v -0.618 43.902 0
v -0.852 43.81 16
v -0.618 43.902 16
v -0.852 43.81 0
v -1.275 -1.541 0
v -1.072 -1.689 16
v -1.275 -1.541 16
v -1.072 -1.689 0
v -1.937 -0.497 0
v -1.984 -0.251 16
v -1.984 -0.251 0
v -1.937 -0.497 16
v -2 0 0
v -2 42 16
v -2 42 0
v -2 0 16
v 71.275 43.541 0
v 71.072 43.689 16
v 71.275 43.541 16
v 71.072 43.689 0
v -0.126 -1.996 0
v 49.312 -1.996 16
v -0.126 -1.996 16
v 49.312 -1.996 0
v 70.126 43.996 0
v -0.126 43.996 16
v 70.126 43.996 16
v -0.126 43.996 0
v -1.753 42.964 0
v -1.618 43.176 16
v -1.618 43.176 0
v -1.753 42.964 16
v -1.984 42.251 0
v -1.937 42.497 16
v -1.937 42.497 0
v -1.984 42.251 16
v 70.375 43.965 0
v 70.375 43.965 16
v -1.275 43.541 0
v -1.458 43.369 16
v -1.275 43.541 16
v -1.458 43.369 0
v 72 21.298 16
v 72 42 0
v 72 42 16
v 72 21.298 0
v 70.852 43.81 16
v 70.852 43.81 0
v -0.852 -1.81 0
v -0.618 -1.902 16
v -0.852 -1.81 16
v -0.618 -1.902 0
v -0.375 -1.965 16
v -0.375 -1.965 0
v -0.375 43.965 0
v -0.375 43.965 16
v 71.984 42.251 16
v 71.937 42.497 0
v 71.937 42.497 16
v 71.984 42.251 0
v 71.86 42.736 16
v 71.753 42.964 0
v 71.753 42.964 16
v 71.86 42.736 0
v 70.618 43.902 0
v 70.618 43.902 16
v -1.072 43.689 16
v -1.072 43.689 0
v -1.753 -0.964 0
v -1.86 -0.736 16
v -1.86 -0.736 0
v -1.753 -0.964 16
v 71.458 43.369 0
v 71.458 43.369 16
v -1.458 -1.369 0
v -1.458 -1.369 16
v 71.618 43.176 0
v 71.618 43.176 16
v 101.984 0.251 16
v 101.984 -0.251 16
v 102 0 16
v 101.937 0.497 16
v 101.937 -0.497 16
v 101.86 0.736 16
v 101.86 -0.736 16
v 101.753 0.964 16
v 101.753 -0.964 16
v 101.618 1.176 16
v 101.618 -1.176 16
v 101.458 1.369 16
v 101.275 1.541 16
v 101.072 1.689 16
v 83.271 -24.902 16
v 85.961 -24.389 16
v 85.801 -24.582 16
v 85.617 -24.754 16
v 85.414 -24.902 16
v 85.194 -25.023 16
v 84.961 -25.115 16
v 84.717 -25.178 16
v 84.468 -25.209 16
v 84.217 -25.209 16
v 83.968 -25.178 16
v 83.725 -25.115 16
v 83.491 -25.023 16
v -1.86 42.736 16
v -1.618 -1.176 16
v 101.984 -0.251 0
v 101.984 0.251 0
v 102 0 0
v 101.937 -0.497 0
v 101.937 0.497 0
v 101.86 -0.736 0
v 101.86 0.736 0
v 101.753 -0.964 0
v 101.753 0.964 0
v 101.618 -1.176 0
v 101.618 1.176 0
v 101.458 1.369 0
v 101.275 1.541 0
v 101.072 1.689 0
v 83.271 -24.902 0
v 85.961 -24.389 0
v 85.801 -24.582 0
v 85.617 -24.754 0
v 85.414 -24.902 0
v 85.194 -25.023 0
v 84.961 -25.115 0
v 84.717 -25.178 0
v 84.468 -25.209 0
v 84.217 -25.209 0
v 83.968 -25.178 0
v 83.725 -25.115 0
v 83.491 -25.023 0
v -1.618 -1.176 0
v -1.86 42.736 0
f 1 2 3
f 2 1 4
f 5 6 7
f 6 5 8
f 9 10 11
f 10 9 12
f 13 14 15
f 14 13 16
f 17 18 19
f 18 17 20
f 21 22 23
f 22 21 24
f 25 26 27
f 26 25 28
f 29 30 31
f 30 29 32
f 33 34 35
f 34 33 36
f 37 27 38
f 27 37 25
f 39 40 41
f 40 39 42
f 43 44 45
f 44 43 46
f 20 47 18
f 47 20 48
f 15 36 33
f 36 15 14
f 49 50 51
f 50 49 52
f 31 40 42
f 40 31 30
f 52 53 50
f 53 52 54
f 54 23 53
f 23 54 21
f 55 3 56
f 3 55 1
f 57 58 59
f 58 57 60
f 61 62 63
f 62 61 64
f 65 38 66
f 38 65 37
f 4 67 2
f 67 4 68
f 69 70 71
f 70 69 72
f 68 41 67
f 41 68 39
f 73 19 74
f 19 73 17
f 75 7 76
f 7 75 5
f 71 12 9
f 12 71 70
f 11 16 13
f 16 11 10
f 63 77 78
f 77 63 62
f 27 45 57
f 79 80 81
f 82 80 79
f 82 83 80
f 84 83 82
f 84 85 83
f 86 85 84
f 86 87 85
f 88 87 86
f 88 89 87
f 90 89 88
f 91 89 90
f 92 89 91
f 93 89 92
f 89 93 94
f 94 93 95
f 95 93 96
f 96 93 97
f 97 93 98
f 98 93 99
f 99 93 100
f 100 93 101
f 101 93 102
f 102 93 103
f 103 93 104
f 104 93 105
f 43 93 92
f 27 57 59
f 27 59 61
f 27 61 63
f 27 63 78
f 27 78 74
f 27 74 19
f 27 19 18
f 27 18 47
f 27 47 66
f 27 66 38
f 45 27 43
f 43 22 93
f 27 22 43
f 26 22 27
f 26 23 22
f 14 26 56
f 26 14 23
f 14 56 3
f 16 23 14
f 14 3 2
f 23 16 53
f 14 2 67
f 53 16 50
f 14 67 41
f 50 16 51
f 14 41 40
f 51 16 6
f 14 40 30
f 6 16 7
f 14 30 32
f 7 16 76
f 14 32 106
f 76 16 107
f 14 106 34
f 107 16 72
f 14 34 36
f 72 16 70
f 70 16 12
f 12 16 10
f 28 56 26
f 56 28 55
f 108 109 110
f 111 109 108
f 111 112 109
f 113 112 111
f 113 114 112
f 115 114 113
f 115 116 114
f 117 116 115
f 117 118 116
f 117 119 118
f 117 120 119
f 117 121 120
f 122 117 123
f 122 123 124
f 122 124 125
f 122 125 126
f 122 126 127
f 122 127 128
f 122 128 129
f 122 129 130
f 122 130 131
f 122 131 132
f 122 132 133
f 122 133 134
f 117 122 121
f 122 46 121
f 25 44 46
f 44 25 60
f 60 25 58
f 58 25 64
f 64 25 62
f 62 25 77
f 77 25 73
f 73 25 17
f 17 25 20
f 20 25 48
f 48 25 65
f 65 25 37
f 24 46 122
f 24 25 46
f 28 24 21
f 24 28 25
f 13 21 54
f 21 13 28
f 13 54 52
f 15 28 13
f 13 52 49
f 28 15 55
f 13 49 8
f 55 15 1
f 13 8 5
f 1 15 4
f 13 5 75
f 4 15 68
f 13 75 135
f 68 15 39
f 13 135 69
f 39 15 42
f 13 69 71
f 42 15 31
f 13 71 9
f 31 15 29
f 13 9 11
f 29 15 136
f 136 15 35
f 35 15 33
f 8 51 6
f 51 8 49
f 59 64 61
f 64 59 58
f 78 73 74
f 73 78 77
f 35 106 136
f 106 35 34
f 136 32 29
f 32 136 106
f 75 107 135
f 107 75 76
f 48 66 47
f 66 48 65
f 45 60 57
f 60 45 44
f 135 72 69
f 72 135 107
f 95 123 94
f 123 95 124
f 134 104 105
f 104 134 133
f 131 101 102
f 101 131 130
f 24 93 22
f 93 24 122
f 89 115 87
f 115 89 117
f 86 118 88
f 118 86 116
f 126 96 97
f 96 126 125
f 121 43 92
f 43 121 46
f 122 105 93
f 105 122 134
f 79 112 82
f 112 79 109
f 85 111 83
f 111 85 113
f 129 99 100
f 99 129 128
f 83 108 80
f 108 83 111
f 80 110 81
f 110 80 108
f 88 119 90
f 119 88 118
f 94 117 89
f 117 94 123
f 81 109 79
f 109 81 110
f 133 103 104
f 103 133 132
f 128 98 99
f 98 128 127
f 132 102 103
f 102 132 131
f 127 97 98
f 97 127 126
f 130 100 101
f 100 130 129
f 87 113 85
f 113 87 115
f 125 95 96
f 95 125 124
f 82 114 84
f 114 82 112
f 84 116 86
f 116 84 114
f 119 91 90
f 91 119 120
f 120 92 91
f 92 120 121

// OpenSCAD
// file: ../common/keyhole.scad
key_hole = 14;
key_holder = key_hole + (2.5 * 2) ;

module key_hole(row, column, plate_thickness = 2) {
    padding = key_holder / 2;
    translate([column * key_holder + padding, row * key_holder + padding, 0]) {
        difference() {
            cube([key_holder, key_holder, plate_thickness], true);
            cube([key_hole, key_hole, plate_thickness + 0.1], true);
        }
    }
}
// file: plate.scad
include <../common/keyhole.scad>;

rows = 3;
columns = 5;

module plate_top() {
    for (row = [0: rows - 1]) {
        for (column = [0: columns - 1]) {
            key_hole(row, column);
        }
    }
}
// main file
include <plate.scad>;

$fn = 50;
heigh = 15;


rows = 3;
cols = 5;

rows_command = 2;
cols_command = 3;


minkowski()
{
    cube([ cols * 14, rows * 14, heigh ]);
    cylinder(r = 2, h = 1);
}

minkowski()
{
    cylinder(r = 2, h = 1);
    translate([ cols * 20, 0, 0 ]) rotate([ 0, 0, 146 ]) cube([ cols_command * 14, rows_command * 14, heigh ]);
}
